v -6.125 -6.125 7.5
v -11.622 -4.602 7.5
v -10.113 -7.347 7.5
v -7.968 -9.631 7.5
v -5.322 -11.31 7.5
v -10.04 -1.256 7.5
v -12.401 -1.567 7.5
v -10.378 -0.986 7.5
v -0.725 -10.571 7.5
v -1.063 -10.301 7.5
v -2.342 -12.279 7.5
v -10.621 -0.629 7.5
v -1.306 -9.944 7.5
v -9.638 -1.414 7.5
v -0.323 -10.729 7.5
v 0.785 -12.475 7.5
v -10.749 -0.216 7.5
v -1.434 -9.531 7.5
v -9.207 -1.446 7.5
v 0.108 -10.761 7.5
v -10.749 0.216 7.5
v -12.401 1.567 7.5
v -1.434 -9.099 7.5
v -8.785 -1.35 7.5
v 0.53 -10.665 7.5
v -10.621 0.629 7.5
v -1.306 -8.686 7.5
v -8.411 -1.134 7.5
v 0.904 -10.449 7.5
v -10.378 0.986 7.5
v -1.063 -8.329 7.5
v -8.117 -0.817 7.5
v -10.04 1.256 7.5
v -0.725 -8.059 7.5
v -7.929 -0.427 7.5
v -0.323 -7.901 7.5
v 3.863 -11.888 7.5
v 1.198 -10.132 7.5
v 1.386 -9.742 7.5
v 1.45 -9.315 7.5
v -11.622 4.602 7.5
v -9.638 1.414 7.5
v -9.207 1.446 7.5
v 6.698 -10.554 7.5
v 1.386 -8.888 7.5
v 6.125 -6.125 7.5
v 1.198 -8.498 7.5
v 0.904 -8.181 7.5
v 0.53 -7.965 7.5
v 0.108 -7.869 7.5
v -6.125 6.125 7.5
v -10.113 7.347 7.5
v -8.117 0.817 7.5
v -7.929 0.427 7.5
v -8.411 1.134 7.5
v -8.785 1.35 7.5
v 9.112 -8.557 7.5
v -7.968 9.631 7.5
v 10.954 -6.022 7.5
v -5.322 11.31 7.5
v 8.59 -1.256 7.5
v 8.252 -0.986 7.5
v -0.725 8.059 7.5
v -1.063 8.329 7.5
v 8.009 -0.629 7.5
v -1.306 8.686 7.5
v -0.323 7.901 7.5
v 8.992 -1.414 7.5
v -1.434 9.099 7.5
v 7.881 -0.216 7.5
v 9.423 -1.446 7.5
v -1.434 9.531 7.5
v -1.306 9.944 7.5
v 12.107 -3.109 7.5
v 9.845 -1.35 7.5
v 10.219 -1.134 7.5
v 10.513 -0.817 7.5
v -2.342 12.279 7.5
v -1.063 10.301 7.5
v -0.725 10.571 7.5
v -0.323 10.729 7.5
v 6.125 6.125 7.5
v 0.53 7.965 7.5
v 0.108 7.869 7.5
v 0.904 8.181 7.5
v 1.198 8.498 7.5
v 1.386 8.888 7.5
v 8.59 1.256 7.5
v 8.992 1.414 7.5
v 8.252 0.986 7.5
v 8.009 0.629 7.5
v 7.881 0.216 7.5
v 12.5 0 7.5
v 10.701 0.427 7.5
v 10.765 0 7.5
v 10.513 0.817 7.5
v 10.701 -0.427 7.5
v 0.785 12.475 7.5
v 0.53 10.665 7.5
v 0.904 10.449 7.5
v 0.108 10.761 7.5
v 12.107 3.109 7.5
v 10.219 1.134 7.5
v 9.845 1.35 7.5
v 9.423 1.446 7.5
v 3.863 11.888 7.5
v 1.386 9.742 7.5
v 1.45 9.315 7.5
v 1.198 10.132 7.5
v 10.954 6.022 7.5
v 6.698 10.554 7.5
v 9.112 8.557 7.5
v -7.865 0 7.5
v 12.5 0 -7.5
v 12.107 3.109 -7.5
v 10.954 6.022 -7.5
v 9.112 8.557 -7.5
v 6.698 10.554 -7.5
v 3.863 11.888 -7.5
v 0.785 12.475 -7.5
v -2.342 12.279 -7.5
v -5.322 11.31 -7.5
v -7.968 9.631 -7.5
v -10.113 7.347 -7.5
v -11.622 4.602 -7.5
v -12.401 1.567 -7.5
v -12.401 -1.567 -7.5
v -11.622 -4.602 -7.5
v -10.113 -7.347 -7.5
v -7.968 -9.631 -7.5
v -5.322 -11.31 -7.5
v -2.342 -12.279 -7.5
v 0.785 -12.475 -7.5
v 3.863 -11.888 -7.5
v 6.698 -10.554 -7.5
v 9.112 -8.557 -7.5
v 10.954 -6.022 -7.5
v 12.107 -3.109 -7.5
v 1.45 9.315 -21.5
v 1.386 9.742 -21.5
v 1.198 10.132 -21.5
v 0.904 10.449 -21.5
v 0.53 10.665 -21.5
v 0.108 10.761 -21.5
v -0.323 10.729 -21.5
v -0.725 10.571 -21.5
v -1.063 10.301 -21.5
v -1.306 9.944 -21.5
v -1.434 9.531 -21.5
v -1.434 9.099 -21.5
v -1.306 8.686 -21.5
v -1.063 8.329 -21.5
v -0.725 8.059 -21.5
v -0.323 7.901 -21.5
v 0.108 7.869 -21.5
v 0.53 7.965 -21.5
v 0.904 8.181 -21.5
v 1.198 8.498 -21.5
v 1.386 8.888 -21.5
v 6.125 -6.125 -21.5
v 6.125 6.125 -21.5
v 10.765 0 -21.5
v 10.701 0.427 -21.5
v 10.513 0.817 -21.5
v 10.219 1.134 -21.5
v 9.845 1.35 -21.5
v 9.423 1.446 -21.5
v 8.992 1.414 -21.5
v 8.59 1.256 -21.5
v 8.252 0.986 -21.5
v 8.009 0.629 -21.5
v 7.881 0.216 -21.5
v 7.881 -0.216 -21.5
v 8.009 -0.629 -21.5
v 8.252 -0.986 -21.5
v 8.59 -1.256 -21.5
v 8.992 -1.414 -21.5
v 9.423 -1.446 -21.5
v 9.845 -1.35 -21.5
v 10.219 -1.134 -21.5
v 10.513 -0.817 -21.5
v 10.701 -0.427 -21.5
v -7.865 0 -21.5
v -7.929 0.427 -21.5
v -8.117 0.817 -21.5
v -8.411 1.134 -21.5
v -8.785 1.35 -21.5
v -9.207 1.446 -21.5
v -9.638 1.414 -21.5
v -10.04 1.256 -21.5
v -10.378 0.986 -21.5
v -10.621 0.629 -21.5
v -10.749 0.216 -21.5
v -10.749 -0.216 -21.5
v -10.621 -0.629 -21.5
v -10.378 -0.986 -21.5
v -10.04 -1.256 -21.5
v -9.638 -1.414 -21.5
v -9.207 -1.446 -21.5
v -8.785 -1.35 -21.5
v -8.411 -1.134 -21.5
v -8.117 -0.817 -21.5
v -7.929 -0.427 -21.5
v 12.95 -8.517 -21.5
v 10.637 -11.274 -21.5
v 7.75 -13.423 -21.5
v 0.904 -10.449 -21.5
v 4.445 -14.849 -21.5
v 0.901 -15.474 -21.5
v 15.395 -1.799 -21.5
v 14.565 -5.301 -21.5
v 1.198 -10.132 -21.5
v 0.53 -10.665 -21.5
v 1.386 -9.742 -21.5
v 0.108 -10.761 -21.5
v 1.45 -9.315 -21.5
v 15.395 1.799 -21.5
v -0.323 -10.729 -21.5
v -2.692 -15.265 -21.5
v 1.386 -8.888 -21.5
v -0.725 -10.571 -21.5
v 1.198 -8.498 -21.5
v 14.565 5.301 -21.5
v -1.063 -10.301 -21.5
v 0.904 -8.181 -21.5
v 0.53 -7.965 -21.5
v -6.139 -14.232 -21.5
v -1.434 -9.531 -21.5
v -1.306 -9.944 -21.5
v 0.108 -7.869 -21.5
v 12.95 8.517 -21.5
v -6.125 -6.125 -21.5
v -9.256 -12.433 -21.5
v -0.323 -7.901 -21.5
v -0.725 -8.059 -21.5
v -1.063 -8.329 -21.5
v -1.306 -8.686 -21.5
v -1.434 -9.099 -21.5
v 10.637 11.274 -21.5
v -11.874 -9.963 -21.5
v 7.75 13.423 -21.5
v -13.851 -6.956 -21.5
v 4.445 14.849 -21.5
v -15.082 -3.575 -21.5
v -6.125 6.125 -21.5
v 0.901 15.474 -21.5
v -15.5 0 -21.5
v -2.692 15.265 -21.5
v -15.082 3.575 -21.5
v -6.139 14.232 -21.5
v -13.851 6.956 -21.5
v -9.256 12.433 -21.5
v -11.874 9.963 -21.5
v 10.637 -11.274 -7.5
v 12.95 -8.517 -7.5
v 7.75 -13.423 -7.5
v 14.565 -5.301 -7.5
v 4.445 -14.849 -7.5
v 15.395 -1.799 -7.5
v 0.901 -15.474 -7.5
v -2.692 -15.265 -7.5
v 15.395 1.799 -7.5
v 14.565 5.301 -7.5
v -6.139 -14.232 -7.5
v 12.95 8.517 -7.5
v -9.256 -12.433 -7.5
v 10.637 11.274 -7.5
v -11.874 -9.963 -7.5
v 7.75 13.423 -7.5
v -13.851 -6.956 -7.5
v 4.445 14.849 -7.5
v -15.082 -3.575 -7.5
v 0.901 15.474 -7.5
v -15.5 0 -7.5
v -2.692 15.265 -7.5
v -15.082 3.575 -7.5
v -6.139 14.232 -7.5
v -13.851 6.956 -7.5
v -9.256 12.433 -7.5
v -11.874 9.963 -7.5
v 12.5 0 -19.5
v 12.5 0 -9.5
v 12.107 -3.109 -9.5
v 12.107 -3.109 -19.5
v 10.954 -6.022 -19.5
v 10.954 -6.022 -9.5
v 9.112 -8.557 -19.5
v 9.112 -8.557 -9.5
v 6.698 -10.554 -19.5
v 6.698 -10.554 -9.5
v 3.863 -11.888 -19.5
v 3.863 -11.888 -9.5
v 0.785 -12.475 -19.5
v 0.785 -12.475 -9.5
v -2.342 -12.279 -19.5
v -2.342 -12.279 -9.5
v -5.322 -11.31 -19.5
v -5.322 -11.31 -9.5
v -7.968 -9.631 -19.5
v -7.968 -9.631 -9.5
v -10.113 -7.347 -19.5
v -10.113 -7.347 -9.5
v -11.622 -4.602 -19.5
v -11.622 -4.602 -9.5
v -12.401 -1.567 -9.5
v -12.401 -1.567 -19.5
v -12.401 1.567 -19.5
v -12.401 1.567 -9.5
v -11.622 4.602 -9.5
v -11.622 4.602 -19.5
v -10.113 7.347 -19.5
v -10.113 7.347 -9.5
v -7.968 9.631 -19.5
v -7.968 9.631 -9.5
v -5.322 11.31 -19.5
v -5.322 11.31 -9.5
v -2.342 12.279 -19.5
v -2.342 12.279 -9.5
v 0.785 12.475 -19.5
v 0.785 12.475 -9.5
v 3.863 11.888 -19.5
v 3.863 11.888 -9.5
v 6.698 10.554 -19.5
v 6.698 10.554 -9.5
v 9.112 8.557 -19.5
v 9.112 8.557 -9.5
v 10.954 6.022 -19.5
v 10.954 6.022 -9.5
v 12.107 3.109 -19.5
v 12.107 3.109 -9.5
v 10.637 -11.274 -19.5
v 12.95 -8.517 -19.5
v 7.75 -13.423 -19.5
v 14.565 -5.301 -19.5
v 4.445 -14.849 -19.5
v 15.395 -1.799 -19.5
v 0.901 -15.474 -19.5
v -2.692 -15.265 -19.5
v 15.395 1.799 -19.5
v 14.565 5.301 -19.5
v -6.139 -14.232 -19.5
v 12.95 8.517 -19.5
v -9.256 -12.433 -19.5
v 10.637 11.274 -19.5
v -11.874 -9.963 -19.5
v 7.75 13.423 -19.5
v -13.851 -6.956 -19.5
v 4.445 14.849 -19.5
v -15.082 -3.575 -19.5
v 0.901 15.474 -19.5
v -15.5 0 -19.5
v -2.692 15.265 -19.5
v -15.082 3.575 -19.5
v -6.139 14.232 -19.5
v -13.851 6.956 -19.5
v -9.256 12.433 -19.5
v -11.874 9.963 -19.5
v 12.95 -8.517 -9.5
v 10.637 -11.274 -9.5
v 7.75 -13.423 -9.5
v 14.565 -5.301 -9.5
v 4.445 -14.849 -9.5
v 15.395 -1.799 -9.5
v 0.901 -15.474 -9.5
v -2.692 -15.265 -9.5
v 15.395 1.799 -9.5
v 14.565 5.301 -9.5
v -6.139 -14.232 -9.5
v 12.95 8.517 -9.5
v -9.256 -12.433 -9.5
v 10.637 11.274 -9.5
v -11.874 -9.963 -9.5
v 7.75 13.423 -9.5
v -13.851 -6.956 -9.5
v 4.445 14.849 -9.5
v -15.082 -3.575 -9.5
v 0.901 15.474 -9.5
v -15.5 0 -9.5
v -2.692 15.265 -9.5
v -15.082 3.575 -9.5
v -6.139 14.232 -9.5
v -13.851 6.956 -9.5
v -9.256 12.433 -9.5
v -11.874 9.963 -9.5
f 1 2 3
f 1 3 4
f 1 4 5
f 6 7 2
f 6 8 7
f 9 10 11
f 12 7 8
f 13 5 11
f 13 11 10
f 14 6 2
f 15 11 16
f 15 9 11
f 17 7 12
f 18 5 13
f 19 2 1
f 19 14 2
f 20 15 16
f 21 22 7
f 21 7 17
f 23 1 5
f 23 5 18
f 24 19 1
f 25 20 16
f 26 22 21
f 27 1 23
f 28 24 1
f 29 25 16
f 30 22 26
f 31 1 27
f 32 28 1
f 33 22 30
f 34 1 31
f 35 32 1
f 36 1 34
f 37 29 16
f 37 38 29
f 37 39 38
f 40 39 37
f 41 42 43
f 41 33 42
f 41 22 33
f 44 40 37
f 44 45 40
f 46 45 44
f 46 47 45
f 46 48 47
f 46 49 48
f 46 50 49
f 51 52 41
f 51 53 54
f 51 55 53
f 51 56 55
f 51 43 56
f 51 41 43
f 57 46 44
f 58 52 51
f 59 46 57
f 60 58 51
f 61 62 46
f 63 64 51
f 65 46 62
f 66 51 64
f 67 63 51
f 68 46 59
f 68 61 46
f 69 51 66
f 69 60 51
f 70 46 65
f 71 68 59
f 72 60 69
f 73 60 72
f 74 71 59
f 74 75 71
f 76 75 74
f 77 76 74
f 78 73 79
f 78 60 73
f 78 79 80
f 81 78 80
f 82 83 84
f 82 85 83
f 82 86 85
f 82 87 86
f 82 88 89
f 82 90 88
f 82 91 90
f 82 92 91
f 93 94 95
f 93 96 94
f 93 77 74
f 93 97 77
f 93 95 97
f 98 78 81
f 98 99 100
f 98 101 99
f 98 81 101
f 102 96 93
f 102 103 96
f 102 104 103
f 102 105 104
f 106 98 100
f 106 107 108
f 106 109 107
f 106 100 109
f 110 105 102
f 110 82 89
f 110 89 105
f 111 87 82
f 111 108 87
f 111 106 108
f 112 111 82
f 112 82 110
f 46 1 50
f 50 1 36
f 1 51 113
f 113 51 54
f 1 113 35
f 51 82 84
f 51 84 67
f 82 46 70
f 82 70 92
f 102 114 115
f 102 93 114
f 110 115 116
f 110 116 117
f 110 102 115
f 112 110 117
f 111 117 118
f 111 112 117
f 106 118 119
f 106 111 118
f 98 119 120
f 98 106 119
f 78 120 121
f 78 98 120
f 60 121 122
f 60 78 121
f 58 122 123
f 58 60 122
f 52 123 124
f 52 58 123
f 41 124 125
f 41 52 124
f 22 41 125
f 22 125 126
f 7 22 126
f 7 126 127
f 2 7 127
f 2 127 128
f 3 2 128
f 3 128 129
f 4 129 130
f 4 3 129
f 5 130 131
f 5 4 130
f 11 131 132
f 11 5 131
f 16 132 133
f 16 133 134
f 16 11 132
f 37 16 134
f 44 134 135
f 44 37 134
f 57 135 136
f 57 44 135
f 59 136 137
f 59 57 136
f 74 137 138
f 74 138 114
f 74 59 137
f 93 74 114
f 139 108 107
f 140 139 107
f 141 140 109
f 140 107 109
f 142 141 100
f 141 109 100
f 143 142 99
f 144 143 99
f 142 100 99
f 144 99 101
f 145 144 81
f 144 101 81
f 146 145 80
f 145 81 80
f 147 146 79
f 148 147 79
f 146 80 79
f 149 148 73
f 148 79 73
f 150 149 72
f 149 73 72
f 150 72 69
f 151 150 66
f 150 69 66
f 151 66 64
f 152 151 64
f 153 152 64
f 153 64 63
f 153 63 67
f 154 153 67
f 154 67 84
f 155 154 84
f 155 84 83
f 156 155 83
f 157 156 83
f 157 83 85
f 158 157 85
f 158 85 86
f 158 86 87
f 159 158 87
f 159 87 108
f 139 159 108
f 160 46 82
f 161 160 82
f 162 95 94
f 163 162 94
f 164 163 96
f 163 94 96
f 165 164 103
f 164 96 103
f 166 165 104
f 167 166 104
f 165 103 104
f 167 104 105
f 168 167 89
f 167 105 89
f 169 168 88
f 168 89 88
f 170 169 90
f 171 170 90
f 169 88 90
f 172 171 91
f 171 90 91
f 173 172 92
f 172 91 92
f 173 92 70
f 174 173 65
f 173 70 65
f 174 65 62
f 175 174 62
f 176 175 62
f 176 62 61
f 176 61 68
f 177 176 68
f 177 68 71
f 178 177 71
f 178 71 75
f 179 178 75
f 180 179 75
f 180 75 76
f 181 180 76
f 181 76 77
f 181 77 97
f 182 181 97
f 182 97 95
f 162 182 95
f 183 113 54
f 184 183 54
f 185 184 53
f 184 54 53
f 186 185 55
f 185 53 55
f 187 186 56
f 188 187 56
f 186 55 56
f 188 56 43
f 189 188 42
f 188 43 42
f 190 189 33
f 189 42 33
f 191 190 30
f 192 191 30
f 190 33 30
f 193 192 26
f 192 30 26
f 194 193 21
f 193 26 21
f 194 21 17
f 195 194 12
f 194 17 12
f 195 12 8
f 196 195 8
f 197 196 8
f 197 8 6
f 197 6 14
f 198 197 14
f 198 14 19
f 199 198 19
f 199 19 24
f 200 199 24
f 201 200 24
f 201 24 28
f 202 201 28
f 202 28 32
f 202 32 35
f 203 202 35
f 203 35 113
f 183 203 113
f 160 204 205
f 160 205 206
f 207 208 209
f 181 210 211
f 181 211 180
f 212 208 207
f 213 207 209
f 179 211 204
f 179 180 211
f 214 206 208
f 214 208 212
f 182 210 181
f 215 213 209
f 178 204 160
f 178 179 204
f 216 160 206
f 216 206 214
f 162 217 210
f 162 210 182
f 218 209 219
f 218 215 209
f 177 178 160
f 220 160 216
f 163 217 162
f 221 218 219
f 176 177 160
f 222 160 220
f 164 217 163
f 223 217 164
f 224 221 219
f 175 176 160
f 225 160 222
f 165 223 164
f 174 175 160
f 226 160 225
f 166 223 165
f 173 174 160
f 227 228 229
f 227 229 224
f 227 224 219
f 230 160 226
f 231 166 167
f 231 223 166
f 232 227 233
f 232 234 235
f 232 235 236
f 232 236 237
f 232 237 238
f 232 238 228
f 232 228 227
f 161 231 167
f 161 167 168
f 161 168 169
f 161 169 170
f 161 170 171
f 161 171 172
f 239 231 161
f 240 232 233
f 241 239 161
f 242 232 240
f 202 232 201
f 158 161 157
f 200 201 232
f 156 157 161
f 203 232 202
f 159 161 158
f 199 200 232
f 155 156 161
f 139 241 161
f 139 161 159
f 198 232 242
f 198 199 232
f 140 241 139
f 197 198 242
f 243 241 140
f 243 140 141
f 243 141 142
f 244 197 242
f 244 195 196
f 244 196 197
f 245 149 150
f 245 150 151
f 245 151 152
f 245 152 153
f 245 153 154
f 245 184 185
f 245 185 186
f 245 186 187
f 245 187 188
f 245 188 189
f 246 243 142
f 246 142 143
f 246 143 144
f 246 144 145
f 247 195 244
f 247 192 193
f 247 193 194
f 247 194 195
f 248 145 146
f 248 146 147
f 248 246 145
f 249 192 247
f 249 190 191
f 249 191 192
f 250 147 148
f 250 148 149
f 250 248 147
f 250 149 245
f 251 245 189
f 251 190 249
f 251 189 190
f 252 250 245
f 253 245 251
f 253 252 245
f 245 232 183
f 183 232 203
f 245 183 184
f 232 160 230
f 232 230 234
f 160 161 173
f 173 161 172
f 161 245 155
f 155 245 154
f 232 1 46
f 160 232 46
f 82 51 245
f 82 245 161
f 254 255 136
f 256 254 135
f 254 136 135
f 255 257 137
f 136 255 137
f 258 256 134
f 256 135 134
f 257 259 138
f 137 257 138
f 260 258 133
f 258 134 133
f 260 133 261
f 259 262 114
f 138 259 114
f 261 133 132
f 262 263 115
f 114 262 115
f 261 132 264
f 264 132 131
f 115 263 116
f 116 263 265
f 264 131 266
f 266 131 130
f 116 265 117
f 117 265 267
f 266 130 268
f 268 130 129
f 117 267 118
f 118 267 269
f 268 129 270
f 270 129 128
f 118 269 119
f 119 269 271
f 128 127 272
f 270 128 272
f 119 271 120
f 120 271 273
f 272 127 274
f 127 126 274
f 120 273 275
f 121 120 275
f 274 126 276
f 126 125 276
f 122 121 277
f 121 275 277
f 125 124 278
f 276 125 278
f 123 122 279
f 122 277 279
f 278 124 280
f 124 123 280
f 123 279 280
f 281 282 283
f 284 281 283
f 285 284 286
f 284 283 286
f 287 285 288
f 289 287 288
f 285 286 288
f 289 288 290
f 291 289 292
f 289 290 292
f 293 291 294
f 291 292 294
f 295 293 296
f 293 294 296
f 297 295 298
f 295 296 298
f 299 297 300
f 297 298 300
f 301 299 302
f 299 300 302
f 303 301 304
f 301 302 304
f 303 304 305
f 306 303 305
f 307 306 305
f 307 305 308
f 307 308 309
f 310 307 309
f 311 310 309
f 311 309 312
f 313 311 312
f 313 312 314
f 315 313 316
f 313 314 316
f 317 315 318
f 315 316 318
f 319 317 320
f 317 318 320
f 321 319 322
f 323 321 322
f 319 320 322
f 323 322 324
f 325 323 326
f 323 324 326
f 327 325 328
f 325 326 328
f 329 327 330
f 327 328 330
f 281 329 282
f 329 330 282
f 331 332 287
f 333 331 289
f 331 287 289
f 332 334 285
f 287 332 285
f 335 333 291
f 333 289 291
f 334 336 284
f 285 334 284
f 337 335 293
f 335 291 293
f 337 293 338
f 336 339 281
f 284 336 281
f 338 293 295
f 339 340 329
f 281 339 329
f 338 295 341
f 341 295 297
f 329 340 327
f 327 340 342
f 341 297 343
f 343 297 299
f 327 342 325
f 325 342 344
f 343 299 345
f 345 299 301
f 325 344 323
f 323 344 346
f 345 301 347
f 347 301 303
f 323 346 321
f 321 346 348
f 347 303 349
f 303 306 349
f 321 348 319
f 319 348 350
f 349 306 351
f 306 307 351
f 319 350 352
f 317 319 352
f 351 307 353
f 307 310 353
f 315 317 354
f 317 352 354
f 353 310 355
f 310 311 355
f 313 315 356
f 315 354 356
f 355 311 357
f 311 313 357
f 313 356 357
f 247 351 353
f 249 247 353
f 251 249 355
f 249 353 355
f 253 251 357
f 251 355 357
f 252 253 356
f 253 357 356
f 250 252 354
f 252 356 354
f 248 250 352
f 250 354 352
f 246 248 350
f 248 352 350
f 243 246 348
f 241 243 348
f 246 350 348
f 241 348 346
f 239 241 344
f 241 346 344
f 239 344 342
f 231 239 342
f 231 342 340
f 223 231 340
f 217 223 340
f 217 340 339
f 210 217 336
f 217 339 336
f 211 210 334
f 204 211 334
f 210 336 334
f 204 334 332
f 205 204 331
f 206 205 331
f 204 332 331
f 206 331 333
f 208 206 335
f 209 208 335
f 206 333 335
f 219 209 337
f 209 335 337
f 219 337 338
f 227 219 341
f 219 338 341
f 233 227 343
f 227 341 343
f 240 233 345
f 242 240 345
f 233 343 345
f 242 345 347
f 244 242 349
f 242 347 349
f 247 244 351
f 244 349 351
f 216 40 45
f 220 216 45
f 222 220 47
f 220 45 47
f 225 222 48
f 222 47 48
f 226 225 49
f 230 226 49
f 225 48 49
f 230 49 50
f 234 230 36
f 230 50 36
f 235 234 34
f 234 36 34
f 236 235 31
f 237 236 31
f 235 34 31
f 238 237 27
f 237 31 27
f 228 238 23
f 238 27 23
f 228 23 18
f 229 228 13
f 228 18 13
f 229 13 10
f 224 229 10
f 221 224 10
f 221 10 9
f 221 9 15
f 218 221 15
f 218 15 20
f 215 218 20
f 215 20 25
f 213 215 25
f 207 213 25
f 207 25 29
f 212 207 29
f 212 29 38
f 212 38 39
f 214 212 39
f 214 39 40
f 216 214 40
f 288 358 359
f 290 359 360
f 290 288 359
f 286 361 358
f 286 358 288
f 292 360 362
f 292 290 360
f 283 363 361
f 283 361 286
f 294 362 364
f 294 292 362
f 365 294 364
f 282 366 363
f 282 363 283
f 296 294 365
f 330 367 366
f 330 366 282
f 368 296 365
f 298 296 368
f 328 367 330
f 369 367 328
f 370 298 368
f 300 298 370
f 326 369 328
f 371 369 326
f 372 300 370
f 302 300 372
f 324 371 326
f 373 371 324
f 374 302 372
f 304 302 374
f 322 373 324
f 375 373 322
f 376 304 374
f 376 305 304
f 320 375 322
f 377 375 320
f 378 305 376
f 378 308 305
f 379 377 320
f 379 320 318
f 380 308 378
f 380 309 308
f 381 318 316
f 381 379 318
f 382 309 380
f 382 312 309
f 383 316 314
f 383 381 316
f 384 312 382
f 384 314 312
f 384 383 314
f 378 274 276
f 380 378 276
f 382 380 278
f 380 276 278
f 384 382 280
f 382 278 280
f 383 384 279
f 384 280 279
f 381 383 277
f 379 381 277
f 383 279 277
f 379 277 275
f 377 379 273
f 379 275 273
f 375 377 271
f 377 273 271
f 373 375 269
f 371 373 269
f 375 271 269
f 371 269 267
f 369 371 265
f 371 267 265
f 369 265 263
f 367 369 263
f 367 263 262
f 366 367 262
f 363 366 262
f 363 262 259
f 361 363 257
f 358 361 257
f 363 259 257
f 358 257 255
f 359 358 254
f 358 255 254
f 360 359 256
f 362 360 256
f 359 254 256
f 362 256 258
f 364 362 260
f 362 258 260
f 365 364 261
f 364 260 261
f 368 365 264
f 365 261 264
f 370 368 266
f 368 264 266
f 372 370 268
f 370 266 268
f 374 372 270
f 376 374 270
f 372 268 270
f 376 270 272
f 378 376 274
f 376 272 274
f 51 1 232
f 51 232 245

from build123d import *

# Parameters (mm, degrees)
SKETCH1_R           = 12.5
BOSS_EXTRUDE1_DEPTH = 7.5
SKETCH13_R          = 15.5
BOSS_EXTRUDE2_DEPTH = 2
SKETCH14_R          = 12.5
BOSS_EXTRUDE3_DEPTH = 10
SKETCH15_R          = 15.5
BOSS_EXTRUDE4_DEPTH = 2
CUT_EXTRUDE1_REACH  = 38.352
SKETCH8_W           = 12.25
SKETCH8_H           = 12.25
CUT_EXTRUDE4_REACH  = 38.352
SKETCH11_R          = 1.45


with BuildPart() as part:
    # Sketch1 → Boss-Extrude1 (new, symmetric)
    with BuildSketch(Plane.XY):
        Circle(SKETCH1_R)
    extrude(amount=BOSS_EXTRUDE1_DEPTH, both=True)

    # Sketch13 → Boss-Extrude2 (add)
    with BuildSketch(Plane(origin=(0, 0, -7.5), x_dir=(-1, 0, 0), z_dir=(0, 0, -1))):
        Circle(SKETCH13_R)
    extrude(amount=BOSS_EXTRUDE2_DEPTH)

    # Sketch14 → Boss-Extrude3 (add)
    with BuildSketch(Plane(origin=(0, 0, -9.5), x_dir=(-1, 0, 0), z_dir=(0, 0, -1))):
        with Locations(Location((0, 0, 0), (0, 0, 180))):
            Circle(SKETCH14_R)
    extrude(amount=BOSS_EXTRUDE3_DEPTH)

    # Sketch15 → Boss-Extrude4 (add)
    with BuildSketch(Plane(origin=(0, 0, -19.5), x_dir=(-1, 0, 0), z_dir=(0, 0, -1))):
        Circle(SKETCH15_R)
    extrude(amount=BOSS_EXTRUDE4_DEPTH)

    # Sketch8 → Cut-Extrude1 (cut, up to next)
    with BuildSketch(Plane.XY.offset(7.5), mode=Mode.PRIVATE) as cut_extrude1_sk1:
        Rectangle(SKETCH8_W, SKETCH8_H)
    cut_extrude1_tool1 = extrude(cut_extrude1_sk1.sketch, amount=-CUT_EXTRUDE1_REACH, mode=Mode.PRIVATE) & part.part
    add(cut_extrude1_tool1.solids().sort_by_distance((0, 0, 7.5))[0], mode=Mode.SUBTRACT)

    # Sketch11 → Cut-Extrude4 (cut, up to next)
    with BuildSketch(Plane.XY.offset(7.5), mode=Mode.PRIVATE) as cut_extrude4_sk1:
        with Locations((9.315, 0)):
            Circle(SKETCH11_R)
    cut_extrude4_tool1 = extrude(cut_extrude4_sk1.sketch, amount=-CUT_EXTRUDE4_REACH, mode=Mode.PRIVATE) & part.part
    # Sketch11 → Cut-Extrude4 (cut, up to next)
    with BuildSketch(Plane.XY.offset(7.5), mode=Mode.PRIVATE) as cut_extrude4_sk2:
        with Locations((0, -9.315)):
            Circle(SKETCH11_R)
    cut_extrude4_tool2 = extrude(cut_extrude4_sk2.sketch, amount=-CUT_EXTRUDE4_REACH, mode=Mode.PRIVATE) & part.part
    # Sketch11 → Cut-Extrude4 (cut, up to next)
    with BuildSketch(Plane.XY.offset(7.5), mode=Mode.PRIVATE) as cut_extrude4_sk3:
        with Locations((-9.315, 0)):
            Circle(SKETCH11_R)
    cut_extrude4_tool3 = extrude(cut_extrude4_sk3.sketch, amount=-CUT_EXTRUDE4_REACH, mode=Mode.PRIVATE) & part.part
    # Sketch11 → Cut-Extrude4 (cut, up to next)
    with BuildSketch(Plane.XY.offset(7.5), mode=Mode.PRIVATE) as cut_extrude4_sk4:
        with Locations((0, 9.315)):
            Circle(SKETCH11_R)
    cut_extrude4_tool4 = extrude(cut_extrude4_sk4.sketch, amount=-CUT_EXTRUDE4_REACH, mode=Mode.PRIVATE) & part.part
    add(cut_extrude4_tool1.solids().sort_by_distance((9.315, 0, 7.5))[0], mode=Mode.SUBTRACT)
    add(cut_extrude4_tool2.solids().sort_by_distance((0, -9.315, 7.5))[0], mode=Mode.SUBTRACT)
    add(cut_extrude4_tool3.solids().sort_by_distance((-9.315, 0, 7.5))[0], mode=Mode.SUBTRACT)
    add(cut_extrude4_tool4.solids().sort_by_distance((0, 9.315, 7.5))[0], mode=Mode.SUBTRACT)


solid = part.part
